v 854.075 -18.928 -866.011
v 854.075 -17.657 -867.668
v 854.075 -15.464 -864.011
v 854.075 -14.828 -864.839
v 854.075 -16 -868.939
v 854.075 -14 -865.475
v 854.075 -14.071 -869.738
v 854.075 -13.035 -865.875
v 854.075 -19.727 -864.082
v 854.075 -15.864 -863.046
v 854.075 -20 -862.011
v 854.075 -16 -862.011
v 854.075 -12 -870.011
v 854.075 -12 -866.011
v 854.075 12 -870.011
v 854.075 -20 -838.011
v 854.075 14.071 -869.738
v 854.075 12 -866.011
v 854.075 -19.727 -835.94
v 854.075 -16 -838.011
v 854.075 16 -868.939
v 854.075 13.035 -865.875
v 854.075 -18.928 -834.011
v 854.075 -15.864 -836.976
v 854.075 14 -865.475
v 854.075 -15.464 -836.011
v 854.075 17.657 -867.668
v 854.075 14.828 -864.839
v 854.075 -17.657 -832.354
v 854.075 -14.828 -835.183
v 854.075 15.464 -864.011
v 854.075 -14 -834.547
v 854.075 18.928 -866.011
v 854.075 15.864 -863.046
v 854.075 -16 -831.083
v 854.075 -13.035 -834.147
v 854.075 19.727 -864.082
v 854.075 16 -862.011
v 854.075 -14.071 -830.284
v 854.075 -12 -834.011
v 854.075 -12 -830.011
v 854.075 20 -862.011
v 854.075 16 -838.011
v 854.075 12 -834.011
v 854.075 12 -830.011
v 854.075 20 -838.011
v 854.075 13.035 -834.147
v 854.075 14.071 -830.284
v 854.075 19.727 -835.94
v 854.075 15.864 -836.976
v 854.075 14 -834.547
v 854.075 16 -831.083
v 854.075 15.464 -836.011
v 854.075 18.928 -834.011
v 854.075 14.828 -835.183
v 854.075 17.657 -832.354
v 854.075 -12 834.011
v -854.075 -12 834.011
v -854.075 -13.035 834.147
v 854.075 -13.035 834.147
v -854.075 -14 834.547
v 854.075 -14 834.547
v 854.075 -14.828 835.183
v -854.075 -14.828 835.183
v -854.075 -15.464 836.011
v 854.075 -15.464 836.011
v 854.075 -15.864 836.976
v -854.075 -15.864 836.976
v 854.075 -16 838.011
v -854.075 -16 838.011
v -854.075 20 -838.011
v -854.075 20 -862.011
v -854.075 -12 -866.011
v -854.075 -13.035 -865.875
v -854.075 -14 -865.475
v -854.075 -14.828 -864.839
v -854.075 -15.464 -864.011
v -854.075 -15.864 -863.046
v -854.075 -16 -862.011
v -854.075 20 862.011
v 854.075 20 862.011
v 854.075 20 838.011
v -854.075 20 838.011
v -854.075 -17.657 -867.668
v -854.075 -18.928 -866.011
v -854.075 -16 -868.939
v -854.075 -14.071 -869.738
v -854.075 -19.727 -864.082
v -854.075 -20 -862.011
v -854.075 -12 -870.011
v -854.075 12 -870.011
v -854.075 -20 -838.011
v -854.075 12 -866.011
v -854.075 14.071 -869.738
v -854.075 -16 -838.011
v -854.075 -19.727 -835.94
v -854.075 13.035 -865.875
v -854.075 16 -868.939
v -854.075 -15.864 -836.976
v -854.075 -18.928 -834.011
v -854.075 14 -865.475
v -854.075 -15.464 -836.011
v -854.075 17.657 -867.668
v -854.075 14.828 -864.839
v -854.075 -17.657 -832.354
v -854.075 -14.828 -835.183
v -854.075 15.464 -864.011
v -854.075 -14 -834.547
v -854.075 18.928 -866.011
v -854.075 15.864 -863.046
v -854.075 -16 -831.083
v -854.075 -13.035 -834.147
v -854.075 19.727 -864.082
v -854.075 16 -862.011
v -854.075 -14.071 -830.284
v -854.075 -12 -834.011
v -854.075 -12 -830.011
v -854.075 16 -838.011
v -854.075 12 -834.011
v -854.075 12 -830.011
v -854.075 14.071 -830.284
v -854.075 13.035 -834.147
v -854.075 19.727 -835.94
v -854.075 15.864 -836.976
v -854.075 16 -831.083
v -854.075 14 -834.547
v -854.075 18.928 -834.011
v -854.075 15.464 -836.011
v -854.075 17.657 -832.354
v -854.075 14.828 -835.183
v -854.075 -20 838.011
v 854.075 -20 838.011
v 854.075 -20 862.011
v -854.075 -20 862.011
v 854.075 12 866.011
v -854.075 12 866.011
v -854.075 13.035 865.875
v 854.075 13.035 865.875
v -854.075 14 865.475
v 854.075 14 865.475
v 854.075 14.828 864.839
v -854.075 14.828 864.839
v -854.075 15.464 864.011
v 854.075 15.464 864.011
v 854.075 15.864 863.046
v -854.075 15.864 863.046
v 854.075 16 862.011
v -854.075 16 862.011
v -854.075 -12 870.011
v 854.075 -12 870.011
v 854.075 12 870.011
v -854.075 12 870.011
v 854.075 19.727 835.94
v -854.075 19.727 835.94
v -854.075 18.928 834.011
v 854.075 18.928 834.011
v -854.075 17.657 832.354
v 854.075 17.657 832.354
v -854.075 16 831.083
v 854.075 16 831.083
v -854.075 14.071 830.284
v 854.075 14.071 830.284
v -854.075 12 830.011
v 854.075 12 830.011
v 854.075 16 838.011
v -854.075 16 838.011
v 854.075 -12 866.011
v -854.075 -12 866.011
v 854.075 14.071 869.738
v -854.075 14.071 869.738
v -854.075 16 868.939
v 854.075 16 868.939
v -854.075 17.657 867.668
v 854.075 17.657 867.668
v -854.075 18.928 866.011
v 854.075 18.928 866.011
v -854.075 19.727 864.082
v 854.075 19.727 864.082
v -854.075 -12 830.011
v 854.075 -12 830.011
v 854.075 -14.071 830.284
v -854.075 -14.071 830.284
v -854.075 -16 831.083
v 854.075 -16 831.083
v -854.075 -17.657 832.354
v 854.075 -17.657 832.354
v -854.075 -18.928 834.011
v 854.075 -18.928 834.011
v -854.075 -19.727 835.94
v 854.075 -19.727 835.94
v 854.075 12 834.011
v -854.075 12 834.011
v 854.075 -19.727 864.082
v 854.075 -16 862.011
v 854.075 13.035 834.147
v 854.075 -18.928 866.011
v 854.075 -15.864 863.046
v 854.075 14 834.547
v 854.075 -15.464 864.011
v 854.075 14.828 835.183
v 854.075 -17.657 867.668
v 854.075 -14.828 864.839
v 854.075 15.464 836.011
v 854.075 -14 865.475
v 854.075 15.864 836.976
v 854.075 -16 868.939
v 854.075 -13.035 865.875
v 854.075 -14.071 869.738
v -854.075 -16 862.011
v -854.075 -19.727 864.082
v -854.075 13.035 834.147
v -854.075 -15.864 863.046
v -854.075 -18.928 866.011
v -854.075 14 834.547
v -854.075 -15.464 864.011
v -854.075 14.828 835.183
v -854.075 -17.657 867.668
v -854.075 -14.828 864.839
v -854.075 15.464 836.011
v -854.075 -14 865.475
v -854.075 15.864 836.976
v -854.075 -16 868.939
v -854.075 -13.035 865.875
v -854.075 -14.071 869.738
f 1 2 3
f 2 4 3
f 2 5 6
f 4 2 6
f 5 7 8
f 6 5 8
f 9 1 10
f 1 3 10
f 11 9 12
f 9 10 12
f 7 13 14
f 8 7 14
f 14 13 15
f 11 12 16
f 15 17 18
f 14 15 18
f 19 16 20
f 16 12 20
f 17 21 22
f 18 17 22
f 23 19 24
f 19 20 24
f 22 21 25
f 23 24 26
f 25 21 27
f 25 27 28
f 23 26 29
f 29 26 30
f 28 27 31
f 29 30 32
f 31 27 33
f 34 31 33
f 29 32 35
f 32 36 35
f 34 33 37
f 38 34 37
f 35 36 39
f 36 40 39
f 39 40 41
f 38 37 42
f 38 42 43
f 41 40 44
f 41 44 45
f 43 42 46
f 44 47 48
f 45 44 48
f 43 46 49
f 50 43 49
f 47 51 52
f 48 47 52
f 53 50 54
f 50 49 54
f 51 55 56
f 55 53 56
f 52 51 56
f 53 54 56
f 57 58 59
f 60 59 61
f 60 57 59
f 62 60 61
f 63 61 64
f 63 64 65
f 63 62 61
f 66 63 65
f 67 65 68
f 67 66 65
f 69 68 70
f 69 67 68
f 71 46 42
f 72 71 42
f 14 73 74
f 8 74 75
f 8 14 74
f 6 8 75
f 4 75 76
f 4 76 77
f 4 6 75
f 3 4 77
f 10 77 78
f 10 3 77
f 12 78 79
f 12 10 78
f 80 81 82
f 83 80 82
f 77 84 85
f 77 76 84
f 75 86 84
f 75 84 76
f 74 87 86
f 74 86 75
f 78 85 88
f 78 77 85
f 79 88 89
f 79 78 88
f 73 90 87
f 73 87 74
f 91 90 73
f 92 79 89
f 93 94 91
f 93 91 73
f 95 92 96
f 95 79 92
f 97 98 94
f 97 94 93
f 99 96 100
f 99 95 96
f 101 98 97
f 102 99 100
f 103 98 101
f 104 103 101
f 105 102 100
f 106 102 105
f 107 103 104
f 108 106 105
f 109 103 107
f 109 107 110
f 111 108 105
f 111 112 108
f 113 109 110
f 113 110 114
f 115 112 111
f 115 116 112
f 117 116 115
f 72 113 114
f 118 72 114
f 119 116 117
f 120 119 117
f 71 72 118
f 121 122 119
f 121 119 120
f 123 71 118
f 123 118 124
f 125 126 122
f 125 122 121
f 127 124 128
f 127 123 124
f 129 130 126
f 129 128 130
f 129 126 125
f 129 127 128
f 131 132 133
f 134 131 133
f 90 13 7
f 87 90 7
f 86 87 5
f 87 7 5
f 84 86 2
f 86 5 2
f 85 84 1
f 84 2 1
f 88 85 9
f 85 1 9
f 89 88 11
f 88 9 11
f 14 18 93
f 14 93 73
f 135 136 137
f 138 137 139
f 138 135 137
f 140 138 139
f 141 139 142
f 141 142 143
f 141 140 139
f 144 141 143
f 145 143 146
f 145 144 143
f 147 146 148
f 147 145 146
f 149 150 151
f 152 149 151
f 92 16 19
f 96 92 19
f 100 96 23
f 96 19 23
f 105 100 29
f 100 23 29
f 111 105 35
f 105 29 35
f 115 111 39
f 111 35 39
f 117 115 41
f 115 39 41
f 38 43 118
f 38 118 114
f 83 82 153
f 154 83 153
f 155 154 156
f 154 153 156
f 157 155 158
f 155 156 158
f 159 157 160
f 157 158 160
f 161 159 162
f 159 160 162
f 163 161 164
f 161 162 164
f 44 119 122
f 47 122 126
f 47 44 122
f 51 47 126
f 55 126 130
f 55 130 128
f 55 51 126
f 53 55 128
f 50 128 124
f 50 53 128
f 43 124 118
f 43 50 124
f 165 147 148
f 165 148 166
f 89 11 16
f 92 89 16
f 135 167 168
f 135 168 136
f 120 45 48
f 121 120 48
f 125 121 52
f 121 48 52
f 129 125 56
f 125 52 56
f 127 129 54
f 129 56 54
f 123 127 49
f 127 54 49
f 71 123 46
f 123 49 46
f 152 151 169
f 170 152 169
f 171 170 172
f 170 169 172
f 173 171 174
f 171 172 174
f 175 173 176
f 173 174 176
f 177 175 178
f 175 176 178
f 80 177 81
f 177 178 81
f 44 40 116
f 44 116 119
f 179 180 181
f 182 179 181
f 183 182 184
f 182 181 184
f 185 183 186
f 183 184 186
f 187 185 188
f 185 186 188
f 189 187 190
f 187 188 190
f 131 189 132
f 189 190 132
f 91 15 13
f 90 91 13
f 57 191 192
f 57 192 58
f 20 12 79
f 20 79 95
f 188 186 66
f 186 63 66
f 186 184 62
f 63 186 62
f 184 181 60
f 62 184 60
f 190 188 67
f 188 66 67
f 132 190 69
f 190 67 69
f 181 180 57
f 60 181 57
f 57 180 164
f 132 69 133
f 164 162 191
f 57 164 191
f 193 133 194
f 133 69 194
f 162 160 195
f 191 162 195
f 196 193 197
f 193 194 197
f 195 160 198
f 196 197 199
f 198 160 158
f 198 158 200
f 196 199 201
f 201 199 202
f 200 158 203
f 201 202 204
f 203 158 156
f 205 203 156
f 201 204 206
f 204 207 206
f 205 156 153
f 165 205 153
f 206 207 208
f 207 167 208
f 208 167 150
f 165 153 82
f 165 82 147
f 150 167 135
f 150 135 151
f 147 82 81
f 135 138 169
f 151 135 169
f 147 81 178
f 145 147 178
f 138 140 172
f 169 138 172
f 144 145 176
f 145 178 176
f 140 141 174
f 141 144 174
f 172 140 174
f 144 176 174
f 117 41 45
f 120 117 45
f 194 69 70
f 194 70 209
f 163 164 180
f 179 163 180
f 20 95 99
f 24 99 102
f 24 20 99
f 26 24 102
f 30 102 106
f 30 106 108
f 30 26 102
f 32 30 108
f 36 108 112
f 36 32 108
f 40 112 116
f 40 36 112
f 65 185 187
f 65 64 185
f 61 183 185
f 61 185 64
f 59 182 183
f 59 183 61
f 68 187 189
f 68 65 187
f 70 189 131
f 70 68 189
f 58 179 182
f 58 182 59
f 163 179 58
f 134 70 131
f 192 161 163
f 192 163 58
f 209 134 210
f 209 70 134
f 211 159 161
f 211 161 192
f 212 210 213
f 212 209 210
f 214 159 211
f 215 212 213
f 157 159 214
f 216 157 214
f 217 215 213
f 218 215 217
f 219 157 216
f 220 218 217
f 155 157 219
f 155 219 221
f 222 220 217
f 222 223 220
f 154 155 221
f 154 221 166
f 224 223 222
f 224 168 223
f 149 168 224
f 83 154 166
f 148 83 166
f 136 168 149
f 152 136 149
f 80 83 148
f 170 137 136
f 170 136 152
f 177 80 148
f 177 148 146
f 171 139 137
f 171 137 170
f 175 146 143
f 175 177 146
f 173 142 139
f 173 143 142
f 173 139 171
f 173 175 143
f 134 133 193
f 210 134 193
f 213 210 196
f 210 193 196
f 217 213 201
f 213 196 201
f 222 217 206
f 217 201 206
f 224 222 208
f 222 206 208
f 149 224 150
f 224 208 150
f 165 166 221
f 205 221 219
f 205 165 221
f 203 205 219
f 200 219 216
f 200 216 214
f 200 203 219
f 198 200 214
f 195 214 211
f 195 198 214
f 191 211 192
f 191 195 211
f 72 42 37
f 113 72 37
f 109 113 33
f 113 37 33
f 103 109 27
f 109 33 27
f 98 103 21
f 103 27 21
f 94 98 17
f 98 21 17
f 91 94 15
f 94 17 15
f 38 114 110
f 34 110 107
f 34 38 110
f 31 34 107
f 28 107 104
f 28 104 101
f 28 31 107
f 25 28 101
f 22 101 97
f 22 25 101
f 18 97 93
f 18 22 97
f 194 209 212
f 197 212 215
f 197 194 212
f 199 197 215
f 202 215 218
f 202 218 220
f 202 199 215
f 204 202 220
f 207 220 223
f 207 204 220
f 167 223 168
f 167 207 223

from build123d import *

# Parameters (mm, degrees)
SQUARE_TUBE_40_X_40_X_4_1_DEPTH   = 1708.15
SQUARE_TUBE_40_X_40_X_4_1_2_DEPTH = 1708.15


with BuildPart() as part:
    # Sketch12 → Square tube 40 X 40 X 4(1) (new body)
    with BuildSketch(Plane(origin=(854.075, 0, -850.011), x_dir=(0, 0, 1), z_dir=(-1, 0, 0))):
        with BuildLine():
            Line((-12, -20), (12, -20))
            ThreePointArc((12, -20), (17.656854249, -17.656854249), (20, -12))
            Line((20, -12), (20, 12))
            ThreePointArc((20, 12), (17.656854249, 17.656854249), (12, 20))
            Line((12, 20), (-12, 20))
            ThreePointArc((-12, 20), (-17.656854249, 17.656854249), (-20, 12))
            Line((-20, 12), (-20, -12))
            ThreePointArc((-20, -12), (-17.656854249, -17.656854249), (-12, -20))
        make_face()
        with BuildLine():
            Line((-12, -16), (12, -16))
            ThreePointArc((12, -16), (14.828427125, -14.828427125), (16, -12))
            Line((16, -12), (16, 12))
            ThreePointArc((16, 12), (14.828427125, 14.828427125), (12, 16))
            Line((12, 16), (-12, 16))
            ThreePointArc((-12, 16), (-14.828427125, 14.828427125), (-16, 12))
            Line((-16, 12), (-16, -12))
            ThreePointArc((-16, -12), (-14.828427125, -14.828427125), (-12, -16))
        make_face(mode=Mode.SUBTRACT)
    extrude(amount=SQUARE_TUBE_40_X_40_X_4_1_DEPTH)


with BuildPart() as body_2:
    # Sketch12 on segment 2 (carried to segment 2) → Square tube 40 X 40 X 4_1 2 (new body)
    with BuildSketch(Plane(origin=(854.075, 0, 850.011), x_dir=(0, 0, 1), z_dir=(-1, 0, 0))):
        with BuildLine():
            Line((-12, -20), (12, -20))
            ThreePointArc((12, -20), (17.656854249, -17.656854249), (20, -12))
            Line((20, -12), (20, 12))
            ThreePointArc((20, 12), (17.656854249, 17.656854249), (12, 20))
            Line((12, 20), (-12, 20))
            ThreePointArc((-12, 20), (-17.656854249, 17.656854249), (-20, 12))
            Line((-20, 12), (-20, -12))
            ThreePointArc((-20, -12), (-17.656854249, -17.656854249), (-12, -20))
        make_face()
        with BuildLine():
            Line((-12, -16), (12, -16))
            ThreePointArc((12, -16), (14.828427125, -14.828427125), (16, -12))
            Line((16, -12), (16, 12))
            ThreePointArc((16, 12), (14.828427125, 14.828427125), (12, 16))
            Line((12, 16), (-12, 16))
            ThreePointArc((-12, 16), (-14.828427125, 14.828427125), (-16, 12))
            Line((-16, 12), (-16, -12))
            ThreePointArc((-16, -12), (-14.828427125, -14.828427125), (-12, -16))
        make_face(mode=Mode.SUBTRACT)
    extrude(amount=SQUARE_TUBE_40_X_40_X_4_1_2_DEPTH)


solid = Compound([part.part, body_2.part])
